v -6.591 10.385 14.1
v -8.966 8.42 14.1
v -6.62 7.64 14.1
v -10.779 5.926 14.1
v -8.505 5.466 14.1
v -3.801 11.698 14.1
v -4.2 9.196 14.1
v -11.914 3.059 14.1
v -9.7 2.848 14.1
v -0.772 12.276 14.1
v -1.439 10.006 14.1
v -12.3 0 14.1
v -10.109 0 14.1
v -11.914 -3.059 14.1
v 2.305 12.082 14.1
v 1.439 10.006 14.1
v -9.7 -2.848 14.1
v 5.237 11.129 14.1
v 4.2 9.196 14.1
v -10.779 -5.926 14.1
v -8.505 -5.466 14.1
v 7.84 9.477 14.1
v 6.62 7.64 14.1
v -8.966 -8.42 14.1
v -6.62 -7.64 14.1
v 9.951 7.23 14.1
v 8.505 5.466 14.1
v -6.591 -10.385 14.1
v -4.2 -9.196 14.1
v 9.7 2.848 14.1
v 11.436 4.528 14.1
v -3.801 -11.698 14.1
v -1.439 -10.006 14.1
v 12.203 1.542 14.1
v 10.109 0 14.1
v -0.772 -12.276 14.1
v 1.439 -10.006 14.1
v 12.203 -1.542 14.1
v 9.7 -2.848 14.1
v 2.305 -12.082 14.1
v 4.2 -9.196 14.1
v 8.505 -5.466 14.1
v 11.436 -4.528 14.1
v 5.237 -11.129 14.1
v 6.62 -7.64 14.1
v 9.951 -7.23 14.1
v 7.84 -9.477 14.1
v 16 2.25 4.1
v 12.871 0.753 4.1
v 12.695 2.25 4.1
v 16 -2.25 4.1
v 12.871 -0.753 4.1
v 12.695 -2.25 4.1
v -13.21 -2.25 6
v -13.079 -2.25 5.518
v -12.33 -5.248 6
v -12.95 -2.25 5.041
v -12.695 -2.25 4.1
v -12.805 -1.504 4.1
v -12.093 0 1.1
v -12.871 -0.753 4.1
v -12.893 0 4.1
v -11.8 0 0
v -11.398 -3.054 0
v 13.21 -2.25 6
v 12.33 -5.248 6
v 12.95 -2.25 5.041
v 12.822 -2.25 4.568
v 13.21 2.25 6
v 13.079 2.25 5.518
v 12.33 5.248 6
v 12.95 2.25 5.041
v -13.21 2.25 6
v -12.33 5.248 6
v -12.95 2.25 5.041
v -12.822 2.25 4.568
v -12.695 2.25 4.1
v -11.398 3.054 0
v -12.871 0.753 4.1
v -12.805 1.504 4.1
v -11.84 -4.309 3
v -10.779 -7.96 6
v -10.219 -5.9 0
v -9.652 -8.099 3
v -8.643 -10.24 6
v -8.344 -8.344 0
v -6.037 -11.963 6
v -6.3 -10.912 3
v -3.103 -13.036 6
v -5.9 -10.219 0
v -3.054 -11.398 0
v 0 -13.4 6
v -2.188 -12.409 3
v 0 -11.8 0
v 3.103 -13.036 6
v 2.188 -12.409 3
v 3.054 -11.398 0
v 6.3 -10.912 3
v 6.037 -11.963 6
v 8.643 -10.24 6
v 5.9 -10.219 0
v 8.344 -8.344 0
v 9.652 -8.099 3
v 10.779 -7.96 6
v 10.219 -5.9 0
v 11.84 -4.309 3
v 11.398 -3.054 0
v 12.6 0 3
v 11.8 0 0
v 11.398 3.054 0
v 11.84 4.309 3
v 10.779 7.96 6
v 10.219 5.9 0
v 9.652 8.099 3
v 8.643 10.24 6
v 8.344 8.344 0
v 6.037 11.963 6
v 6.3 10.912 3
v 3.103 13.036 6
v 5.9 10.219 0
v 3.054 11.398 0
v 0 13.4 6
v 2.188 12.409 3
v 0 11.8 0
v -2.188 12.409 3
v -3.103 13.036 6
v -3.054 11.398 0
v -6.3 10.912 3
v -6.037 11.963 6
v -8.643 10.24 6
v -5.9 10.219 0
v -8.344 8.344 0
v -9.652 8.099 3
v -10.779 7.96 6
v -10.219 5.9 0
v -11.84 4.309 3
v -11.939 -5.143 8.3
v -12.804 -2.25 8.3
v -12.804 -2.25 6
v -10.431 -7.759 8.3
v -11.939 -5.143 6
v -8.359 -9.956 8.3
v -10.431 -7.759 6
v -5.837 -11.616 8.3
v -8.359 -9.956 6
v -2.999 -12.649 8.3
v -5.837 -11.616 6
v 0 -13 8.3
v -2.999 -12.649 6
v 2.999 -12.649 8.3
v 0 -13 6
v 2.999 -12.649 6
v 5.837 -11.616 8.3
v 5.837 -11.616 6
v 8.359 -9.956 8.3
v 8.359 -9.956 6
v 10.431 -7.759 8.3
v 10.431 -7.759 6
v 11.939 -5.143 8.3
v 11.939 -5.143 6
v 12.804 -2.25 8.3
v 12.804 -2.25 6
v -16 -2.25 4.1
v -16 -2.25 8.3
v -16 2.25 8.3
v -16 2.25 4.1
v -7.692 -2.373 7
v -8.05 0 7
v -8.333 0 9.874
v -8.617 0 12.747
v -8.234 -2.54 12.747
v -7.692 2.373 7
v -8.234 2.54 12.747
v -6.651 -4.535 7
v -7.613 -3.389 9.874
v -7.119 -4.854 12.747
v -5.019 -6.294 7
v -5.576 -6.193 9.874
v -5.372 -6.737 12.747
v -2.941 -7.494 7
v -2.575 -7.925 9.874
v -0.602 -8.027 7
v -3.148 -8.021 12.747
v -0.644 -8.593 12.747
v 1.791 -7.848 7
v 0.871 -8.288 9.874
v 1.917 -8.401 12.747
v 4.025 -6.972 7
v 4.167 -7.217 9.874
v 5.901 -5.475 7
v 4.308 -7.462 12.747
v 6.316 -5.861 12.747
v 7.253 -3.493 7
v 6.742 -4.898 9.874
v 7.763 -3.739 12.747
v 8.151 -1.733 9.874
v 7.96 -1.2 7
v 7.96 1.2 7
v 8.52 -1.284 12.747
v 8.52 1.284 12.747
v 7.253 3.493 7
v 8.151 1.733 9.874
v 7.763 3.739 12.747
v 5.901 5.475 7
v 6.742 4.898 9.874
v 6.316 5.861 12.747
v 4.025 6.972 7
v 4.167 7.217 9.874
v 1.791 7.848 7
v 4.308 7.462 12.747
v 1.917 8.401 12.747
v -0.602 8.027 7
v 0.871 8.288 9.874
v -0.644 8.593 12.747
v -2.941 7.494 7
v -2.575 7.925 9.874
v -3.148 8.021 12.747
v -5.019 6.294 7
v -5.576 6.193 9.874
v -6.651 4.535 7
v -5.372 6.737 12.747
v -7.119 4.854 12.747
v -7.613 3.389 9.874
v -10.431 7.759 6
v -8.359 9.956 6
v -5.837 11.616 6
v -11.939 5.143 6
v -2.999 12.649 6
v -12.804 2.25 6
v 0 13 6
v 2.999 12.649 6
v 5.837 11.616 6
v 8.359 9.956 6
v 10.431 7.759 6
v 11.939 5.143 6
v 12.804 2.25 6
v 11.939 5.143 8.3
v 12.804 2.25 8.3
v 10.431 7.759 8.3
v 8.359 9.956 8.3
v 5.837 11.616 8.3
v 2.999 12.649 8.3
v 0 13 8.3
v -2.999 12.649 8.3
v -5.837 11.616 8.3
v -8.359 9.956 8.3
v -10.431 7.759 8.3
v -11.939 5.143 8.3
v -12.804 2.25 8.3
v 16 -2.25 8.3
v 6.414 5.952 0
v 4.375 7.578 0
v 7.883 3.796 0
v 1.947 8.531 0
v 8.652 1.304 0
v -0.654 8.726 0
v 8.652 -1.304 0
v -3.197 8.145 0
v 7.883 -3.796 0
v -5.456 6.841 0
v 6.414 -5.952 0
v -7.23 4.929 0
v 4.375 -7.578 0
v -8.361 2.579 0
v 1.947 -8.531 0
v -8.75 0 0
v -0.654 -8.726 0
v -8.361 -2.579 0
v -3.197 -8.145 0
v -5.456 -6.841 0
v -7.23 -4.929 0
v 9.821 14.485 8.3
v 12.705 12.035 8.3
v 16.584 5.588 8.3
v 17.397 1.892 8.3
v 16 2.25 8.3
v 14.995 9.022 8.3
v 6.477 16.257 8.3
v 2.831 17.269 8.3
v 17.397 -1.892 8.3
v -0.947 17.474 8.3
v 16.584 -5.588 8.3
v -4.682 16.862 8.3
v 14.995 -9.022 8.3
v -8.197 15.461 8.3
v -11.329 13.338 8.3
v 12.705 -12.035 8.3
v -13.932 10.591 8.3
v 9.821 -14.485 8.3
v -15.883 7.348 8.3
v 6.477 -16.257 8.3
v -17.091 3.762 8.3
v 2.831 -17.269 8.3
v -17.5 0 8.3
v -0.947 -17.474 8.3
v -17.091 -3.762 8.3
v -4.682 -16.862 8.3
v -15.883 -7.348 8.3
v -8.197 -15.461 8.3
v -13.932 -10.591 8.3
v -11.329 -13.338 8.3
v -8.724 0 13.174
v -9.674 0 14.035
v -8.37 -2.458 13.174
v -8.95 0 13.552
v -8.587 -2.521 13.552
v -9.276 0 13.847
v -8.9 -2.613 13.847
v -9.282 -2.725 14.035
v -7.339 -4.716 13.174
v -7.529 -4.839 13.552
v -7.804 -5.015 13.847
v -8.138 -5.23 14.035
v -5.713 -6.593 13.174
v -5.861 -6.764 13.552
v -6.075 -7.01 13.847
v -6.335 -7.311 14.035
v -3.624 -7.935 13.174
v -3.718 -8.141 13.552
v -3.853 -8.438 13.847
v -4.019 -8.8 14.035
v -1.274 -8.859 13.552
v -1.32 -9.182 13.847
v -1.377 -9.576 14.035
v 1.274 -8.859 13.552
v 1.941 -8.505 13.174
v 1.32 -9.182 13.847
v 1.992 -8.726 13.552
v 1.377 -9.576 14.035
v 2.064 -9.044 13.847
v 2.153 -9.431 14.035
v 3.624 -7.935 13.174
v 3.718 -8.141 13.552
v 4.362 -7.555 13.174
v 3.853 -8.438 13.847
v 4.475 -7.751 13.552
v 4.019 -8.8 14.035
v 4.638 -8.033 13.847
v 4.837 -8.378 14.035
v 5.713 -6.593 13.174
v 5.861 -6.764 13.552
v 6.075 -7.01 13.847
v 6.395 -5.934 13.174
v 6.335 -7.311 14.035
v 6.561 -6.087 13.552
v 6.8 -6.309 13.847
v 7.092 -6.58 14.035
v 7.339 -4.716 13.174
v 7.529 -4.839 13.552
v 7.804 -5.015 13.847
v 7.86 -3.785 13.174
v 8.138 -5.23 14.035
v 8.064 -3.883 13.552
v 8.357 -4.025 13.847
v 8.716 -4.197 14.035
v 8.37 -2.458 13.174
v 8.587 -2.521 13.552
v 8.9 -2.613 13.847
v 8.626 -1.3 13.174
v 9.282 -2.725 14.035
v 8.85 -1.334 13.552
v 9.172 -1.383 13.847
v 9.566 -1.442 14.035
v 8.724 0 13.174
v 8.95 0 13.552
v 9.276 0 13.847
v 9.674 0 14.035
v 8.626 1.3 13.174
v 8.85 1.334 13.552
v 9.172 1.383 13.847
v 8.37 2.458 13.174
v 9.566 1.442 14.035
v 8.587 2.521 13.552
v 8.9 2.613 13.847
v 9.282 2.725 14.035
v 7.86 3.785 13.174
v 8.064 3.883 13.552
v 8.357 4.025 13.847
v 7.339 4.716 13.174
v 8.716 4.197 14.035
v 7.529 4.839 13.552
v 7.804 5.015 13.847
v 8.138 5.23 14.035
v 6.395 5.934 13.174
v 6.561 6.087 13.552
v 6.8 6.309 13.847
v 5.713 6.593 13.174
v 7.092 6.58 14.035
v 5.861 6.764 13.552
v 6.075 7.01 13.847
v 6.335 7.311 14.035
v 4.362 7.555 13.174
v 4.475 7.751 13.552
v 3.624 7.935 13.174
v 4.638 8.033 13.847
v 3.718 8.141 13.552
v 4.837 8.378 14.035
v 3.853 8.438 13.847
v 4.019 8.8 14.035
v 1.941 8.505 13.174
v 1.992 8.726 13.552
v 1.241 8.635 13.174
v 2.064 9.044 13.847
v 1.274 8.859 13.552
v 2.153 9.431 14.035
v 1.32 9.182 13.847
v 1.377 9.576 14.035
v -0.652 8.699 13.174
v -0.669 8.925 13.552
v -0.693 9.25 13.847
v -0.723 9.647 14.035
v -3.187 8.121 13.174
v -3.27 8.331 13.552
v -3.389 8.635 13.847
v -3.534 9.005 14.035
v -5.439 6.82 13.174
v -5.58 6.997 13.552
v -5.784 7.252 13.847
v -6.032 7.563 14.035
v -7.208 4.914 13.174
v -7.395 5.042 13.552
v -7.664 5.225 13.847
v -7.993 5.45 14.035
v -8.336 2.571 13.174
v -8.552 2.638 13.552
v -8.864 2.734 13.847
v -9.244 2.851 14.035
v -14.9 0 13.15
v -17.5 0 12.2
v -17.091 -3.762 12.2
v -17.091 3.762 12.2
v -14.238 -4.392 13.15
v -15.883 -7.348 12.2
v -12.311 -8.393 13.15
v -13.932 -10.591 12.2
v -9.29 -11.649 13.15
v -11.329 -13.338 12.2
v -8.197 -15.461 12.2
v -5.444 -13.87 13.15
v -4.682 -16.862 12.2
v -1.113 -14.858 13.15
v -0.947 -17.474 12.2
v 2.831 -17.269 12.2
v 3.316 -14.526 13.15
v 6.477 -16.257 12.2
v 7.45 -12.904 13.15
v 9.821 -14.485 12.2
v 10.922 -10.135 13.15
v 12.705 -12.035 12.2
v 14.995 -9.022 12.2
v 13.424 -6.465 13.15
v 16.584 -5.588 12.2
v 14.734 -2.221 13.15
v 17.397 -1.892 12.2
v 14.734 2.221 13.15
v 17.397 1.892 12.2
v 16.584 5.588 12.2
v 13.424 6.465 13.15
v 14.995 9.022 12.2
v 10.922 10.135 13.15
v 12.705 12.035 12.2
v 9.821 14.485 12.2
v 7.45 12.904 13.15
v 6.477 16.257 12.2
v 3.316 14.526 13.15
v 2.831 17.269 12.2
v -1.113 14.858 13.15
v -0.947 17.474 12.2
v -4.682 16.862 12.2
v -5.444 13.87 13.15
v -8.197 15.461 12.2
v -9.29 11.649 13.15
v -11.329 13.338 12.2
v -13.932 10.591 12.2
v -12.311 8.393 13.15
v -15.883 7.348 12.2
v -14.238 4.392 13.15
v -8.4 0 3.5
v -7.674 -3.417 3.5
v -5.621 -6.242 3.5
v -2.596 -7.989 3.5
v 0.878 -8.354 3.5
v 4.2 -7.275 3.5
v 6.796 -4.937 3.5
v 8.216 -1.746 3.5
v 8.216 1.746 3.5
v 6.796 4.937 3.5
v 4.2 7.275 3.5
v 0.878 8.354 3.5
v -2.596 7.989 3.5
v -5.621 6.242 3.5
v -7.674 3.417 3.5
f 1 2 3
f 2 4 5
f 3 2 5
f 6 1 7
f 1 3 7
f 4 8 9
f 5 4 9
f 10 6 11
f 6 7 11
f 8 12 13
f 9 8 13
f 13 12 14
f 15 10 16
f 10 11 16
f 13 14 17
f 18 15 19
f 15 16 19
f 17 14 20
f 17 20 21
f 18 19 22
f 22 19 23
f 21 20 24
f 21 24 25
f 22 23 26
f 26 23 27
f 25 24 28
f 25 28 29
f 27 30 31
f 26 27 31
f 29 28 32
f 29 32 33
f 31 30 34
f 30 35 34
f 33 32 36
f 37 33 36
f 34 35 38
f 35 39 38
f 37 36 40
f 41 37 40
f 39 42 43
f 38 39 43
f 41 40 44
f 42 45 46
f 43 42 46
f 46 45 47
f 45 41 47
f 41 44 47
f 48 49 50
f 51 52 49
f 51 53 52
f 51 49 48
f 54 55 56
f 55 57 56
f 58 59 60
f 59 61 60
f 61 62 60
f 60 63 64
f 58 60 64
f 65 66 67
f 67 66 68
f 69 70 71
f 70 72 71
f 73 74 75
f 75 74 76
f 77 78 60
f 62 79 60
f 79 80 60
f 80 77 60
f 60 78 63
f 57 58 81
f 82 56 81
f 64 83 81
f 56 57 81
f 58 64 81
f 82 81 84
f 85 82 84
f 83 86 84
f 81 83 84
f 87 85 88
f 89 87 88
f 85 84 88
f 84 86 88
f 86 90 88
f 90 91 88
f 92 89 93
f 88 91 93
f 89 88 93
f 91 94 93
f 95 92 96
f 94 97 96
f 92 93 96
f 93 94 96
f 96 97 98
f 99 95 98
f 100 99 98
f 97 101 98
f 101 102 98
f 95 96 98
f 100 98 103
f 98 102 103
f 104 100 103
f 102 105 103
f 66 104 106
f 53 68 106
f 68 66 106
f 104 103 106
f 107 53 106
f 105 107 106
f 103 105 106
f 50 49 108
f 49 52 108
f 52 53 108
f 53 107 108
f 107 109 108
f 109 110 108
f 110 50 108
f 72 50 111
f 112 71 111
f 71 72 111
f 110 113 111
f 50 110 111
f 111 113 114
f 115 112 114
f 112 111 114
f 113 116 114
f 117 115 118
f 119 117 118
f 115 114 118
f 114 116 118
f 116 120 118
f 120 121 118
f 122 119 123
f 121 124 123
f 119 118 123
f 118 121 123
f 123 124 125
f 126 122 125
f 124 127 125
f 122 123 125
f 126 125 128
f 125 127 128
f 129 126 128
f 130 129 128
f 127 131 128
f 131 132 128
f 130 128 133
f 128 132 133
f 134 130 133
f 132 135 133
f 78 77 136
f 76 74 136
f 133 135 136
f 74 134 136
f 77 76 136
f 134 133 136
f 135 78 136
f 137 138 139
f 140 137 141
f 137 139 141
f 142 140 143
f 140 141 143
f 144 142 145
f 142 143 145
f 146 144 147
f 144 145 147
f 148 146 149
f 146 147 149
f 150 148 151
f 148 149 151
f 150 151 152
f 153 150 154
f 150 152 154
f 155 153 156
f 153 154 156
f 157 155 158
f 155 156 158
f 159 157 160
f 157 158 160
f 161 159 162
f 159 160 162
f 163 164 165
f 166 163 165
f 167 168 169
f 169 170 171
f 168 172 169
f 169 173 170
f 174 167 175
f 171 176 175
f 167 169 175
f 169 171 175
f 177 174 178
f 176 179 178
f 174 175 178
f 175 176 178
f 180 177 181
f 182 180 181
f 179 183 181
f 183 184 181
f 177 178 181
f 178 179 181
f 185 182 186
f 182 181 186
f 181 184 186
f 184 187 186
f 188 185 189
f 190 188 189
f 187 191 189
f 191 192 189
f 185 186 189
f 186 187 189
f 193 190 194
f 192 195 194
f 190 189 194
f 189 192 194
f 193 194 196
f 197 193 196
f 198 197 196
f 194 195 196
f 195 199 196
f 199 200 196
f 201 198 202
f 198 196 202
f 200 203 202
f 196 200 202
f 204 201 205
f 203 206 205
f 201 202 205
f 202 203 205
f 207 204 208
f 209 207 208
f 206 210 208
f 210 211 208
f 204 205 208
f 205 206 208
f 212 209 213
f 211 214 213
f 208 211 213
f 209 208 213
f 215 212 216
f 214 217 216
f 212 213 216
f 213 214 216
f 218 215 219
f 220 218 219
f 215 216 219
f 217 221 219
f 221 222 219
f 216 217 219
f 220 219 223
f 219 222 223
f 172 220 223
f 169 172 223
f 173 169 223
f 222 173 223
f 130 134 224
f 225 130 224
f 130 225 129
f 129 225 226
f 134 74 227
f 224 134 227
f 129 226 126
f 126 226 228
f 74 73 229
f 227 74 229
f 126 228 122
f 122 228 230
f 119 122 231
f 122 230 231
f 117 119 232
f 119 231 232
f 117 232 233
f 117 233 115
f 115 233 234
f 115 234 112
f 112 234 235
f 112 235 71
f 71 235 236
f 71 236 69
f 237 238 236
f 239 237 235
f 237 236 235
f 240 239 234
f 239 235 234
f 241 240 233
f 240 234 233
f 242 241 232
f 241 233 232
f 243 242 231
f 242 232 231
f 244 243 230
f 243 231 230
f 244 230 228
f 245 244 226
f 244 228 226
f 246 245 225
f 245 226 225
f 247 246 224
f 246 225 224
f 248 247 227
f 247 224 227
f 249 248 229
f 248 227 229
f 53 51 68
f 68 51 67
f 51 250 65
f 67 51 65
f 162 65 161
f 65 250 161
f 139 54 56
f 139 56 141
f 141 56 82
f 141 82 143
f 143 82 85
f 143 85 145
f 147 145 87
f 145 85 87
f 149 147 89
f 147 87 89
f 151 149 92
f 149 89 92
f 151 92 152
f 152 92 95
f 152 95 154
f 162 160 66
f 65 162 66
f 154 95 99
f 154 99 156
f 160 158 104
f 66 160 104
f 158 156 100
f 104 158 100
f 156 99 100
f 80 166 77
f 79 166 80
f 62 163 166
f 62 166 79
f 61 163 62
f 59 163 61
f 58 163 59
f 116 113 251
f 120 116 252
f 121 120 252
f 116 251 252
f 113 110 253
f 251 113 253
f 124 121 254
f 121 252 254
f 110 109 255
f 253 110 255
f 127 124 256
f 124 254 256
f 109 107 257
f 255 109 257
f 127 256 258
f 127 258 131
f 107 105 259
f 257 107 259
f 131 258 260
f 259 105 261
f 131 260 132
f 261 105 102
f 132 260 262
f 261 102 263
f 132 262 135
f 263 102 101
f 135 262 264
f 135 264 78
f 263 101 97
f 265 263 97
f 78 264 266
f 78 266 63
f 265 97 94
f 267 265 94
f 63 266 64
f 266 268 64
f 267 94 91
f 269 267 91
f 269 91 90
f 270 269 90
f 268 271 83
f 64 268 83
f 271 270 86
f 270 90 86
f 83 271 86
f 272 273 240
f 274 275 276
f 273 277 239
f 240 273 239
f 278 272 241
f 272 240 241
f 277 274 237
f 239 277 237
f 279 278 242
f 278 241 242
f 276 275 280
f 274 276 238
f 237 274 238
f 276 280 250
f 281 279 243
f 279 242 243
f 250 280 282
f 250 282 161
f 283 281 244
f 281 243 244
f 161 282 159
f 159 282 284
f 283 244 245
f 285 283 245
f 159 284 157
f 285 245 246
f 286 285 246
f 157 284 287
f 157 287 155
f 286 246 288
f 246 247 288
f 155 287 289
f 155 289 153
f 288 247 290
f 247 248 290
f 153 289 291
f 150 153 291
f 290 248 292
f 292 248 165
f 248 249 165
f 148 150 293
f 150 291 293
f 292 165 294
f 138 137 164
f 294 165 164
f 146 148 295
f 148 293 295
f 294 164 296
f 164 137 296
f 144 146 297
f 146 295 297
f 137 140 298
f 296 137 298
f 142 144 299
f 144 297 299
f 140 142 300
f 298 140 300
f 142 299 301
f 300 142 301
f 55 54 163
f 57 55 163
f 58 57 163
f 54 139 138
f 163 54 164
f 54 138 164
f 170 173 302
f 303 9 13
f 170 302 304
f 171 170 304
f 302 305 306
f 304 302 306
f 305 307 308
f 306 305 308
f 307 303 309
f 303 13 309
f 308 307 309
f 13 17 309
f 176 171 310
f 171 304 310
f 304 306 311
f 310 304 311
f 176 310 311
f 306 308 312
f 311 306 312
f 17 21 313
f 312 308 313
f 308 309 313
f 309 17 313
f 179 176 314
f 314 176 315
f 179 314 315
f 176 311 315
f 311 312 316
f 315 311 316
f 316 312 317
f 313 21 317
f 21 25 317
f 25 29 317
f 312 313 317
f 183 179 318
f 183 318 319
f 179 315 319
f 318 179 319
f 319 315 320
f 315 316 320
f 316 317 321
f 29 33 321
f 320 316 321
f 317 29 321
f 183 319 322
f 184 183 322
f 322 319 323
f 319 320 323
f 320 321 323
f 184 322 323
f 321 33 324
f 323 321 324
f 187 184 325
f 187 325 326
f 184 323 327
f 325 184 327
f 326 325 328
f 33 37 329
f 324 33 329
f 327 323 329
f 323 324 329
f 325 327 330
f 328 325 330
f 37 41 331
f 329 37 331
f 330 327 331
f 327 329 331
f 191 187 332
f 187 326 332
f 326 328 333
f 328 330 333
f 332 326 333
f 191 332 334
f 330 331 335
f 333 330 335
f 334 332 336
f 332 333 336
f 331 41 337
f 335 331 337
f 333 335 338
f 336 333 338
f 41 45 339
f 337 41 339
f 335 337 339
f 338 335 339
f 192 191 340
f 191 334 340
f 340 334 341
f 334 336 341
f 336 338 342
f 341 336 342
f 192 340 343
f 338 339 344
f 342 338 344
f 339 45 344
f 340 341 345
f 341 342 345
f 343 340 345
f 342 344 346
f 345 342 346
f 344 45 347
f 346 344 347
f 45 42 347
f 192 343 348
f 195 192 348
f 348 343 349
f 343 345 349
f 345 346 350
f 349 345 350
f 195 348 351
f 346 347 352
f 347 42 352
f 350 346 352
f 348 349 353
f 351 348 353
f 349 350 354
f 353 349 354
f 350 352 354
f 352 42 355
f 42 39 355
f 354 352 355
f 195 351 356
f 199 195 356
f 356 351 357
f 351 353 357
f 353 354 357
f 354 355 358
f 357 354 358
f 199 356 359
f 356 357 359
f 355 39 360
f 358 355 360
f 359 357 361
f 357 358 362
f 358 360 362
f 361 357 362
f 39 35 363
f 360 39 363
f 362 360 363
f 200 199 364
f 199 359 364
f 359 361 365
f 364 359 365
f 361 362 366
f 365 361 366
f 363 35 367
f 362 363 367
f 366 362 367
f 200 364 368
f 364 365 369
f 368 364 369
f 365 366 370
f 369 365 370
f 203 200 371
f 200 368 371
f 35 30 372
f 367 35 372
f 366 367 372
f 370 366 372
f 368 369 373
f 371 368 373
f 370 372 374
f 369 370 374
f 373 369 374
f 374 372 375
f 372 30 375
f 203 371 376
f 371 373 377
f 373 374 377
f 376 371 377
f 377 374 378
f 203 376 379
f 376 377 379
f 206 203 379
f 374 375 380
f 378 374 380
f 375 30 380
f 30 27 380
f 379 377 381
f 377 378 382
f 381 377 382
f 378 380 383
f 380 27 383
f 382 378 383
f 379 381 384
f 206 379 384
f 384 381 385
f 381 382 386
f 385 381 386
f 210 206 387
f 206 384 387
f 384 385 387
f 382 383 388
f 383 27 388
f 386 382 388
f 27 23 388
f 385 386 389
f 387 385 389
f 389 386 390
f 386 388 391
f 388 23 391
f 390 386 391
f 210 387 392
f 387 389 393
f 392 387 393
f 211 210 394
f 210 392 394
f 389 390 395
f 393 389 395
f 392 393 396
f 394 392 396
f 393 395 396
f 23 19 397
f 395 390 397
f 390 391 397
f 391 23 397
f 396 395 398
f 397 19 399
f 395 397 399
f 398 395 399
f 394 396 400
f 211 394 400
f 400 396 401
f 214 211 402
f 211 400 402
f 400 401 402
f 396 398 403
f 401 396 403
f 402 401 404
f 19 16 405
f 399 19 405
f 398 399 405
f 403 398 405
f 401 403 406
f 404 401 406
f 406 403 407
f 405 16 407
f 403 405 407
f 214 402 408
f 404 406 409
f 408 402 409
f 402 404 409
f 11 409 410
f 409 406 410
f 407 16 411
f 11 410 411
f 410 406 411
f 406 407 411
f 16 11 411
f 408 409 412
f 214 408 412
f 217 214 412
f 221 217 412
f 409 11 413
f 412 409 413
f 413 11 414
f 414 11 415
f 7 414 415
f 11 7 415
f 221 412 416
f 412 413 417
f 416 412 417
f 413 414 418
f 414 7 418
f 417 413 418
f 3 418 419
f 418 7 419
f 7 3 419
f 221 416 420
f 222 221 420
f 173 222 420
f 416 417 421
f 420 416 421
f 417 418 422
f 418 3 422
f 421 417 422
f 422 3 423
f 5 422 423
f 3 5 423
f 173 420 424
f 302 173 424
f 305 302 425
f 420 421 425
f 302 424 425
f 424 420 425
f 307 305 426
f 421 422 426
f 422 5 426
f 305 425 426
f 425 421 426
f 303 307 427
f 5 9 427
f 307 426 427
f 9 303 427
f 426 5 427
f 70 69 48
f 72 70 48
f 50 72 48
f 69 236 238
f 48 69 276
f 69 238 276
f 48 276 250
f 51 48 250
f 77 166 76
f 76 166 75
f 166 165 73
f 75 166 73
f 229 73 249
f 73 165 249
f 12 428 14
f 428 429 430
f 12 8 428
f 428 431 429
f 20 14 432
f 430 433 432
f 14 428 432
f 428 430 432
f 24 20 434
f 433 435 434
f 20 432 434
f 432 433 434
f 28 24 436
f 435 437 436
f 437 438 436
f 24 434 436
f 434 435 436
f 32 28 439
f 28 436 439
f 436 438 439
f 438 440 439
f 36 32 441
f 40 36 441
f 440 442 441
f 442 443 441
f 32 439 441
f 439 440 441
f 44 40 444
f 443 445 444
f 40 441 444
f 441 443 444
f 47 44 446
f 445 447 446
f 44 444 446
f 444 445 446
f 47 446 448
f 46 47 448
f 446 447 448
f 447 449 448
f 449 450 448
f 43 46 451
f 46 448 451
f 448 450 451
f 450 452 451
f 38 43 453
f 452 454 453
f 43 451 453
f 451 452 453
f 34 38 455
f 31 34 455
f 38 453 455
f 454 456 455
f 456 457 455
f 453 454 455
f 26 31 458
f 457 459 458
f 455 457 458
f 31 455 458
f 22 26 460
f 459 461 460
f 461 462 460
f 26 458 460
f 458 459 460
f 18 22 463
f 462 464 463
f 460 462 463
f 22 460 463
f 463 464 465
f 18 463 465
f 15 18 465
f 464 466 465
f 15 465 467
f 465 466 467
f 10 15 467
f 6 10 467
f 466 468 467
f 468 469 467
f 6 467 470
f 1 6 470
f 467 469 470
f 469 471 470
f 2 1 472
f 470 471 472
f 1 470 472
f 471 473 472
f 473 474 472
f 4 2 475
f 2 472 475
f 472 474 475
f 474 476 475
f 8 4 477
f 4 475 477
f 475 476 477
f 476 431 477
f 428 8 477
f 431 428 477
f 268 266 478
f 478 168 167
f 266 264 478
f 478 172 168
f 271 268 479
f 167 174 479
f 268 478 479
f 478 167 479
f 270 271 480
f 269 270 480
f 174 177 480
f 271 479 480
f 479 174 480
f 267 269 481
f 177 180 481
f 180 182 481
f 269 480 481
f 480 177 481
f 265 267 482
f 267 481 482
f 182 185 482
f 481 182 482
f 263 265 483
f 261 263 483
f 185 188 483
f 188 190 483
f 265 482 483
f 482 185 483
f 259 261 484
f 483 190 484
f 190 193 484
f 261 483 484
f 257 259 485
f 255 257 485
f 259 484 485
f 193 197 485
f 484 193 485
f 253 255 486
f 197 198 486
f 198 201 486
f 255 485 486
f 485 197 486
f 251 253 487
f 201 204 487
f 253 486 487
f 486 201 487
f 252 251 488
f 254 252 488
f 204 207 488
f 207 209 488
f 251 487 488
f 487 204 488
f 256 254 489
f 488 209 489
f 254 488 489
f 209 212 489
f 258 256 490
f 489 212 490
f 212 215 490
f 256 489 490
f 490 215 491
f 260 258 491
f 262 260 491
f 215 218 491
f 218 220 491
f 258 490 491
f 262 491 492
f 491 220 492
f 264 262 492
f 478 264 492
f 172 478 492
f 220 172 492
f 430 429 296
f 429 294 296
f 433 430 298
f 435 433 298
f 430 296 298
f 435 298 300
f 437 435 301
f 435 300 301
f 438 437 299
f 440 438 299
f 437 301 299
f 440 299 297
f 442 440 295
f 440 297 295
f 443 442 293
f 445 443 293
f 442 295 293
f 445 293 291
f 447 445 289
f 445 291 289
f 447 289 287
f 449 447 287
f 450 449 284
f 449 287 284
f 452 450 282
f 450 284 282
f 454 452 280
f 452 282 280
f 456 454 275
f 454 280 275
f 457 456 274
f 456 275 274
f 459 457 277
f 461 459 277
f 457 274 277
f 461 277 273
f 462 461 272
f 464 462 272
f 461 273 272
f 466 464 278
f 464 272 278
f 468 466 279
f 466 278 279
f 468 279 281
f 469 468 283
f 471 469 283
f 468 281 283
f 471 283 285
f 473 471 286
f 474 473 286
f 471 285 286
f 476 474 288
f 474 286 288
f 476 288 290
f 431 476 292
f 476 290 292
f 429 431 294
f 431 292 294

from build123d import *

# Parameters (mm, degrees)
F2_R     = 1.5
F4_DEPTH = 4.2


with BuildPart() as f1:
    # F0 (on Front) → F1 (revolve)
    with BuildSketch(Plane.XZ):
        Polygon((-11.8, 0), (-8.75, 0), (-8.05, 7), (-8.75, 14.1), (-12.3, 14.1), (-17.5, 12.2), (-17.5, 8.3), (-13, 8.3), (-13, 6), (-13.4, 6), align=None)
    revolve(axis=Axis((0, 0, 7.750909), (0, 0, 1)))

    # F2
    f2_edges = [f1.edges().sort_by_distance(p)[0] for p in [
        (8.75, 0, 14.1),
    ]]
    fillet(f2_edges, radius=F2_R)

    # F3 (on face) → F4 (join)
    with BuildSketch(Plane(origin=(0, 0, 8.3), x_dir=(1, 0, 0), z_dir=(0, 0, -1))):
        with BuildLine():
            ThreePointArc((-12.803808, -2.25), (-13, 0), (-12.803808, 2.25))
            Line((-12.803808, 2.25), (-16, 2.25))
            Line((-16, 2.25), (-16, -2.25))
            Line((-16, -2.25), (-12.803808, -2.25))
        make_face()
        with BuildLine():
            Line((16, 2.25), (12.803808, 2.25))
            ThreePointArc((12.803808, 2.25), (12.950859, 1.129269), (13, 0))
            ThreePointArc((13, 0), (12.950859, -1.129269), (12.803808, -2.25))
            Line((12.803808, -2.25), (16, -2.25))
            Line((16, -2.25), (16, 2.25))
        make_face()
        with BuildLine():
            ThreePointArc((13, 0), (12.950859, 1.129269), (12.803808, 2.25))
            Line((12.803808, 2.25), (12, 2.25))
            Line((12, 2.25), (12, -2.25))
            Line((12, -2.25), (12.803808, -2.25))
            ThreePointArc((12.803808, -2.25), (12.950859, -1.129269), (13, 0))
        make_face()
        with BuildLine():
            Line((-12, -2.25), (-12, 2.25))
            Line((-12, 2.25), (-12.803808, 2.25))
            ThreePointArc((-12.803808, 2.25), (-13, 0), (-12.803808, -2.25))
            Line((-12.803808, -2.25), (-12, -2.25))
        make_face()
    extrude(amount=F4_DEPTH)


solid = f1.part
